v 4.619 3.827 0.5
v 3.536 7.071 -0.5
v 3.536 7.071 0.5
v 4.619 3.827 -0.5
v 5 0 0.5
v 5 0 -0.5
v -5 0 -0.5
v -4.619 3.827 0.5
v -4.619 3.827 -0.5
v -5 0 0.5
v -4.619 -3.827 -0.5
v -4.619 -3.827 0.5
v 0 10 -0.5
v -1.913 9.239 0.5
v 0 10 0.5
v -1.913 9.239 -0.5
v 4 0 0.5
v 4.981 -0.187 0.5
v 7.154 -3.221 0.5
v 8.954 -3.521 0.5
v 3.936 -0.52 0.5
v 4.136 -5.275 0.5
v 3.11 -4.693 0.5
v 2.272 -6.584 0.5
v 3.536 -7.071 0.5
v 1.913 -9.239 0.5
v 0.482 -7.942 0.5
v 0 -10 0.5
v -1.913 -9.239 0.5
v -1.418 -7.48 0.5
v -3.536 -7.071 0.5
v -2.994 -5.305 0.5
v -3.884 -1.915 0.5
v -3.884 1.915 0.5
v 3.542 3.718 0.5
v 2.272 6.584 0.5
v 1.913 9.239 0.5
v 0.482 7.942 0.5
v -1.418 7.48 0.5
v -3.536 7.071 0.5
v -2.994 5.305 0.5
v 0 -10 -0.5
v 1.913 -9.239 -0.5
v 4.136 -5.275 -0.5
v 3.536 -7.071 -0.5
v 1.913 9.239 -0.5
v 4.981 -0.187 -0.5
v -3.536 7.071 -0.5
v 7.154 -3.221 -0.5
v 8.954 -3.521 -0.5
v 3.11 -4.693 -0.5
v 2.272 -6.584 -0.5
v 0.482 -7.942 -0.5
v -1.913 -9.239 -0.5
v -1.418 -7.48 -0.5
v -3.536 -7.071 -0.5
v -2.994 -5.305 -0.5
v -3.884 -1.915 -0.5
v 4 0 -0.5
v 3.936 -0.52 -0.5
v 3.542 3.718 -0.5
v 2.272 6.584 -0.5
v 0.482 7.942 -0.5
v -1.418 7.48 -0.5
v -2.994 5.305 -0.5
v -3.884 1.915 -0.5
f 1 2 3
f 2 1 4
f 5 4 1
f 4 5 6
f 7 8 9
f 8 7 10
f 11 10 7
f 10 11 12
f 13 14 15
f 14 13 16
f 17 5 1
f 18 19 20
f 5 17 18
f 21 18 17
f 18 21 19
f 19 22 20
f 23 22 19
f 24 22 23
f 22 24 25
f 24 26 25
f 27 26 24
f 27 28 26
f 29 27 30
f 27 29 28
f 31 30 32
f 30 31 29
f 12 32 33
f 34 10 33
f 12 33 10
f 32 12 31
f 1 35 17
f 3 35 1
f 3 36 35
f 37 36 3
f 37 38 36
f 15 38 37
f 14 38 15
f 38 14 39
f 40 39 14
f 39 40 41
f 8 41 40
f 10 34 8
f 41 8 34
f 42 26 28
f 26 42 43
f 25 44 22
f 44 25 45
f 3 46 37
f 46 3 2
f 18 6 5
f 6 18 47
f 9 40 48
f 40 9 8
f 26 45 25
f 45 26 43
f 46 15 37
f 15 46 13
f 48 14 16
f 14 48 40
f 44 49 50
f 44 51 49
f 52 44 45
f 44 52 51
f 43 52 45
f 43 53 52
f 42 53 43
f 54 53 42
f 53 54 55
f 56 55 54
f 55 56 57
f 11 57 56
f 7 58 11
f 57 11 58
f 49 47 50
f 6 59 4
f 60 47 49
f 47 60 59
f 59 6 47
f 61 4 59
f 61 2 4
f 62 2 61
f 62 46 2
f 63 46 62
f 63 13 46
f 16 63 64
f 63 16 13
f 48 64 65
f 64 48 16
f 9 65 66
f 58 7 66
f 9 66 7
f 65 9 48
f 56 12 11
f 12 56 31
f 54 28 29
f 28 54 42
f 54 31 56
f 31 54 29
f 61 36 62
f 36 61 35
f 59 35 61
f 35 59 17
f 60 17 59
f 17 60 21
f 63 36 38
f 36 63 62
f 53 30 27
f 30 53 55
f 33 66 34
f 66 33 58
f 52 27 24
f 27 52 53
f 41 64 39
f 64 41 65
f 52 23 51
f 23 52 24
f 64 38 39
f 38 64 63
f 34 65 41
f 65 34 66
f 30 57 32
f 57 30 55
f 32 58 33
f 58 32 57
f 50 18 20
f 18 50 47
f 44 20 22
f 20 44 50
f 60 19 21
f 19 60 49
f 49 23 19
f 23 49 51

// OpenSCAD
color([0,0,1])difference(){union() {
difference(){scale([1,2,1])cylinder(h=1, r=5, center=true);
scale([1,2,1])cylinder(h=1.02, r=4, center=true);
}translate([6,-3,0])rotate([0,0,-10])cylinder(h=1, r=3, $fn = 3, center=true);
}
translate([4.2,-2.7,-0.01])rotate([0,0,-10])cylinder(h=1.03, r=3, $fn = 3, center=true);
}
